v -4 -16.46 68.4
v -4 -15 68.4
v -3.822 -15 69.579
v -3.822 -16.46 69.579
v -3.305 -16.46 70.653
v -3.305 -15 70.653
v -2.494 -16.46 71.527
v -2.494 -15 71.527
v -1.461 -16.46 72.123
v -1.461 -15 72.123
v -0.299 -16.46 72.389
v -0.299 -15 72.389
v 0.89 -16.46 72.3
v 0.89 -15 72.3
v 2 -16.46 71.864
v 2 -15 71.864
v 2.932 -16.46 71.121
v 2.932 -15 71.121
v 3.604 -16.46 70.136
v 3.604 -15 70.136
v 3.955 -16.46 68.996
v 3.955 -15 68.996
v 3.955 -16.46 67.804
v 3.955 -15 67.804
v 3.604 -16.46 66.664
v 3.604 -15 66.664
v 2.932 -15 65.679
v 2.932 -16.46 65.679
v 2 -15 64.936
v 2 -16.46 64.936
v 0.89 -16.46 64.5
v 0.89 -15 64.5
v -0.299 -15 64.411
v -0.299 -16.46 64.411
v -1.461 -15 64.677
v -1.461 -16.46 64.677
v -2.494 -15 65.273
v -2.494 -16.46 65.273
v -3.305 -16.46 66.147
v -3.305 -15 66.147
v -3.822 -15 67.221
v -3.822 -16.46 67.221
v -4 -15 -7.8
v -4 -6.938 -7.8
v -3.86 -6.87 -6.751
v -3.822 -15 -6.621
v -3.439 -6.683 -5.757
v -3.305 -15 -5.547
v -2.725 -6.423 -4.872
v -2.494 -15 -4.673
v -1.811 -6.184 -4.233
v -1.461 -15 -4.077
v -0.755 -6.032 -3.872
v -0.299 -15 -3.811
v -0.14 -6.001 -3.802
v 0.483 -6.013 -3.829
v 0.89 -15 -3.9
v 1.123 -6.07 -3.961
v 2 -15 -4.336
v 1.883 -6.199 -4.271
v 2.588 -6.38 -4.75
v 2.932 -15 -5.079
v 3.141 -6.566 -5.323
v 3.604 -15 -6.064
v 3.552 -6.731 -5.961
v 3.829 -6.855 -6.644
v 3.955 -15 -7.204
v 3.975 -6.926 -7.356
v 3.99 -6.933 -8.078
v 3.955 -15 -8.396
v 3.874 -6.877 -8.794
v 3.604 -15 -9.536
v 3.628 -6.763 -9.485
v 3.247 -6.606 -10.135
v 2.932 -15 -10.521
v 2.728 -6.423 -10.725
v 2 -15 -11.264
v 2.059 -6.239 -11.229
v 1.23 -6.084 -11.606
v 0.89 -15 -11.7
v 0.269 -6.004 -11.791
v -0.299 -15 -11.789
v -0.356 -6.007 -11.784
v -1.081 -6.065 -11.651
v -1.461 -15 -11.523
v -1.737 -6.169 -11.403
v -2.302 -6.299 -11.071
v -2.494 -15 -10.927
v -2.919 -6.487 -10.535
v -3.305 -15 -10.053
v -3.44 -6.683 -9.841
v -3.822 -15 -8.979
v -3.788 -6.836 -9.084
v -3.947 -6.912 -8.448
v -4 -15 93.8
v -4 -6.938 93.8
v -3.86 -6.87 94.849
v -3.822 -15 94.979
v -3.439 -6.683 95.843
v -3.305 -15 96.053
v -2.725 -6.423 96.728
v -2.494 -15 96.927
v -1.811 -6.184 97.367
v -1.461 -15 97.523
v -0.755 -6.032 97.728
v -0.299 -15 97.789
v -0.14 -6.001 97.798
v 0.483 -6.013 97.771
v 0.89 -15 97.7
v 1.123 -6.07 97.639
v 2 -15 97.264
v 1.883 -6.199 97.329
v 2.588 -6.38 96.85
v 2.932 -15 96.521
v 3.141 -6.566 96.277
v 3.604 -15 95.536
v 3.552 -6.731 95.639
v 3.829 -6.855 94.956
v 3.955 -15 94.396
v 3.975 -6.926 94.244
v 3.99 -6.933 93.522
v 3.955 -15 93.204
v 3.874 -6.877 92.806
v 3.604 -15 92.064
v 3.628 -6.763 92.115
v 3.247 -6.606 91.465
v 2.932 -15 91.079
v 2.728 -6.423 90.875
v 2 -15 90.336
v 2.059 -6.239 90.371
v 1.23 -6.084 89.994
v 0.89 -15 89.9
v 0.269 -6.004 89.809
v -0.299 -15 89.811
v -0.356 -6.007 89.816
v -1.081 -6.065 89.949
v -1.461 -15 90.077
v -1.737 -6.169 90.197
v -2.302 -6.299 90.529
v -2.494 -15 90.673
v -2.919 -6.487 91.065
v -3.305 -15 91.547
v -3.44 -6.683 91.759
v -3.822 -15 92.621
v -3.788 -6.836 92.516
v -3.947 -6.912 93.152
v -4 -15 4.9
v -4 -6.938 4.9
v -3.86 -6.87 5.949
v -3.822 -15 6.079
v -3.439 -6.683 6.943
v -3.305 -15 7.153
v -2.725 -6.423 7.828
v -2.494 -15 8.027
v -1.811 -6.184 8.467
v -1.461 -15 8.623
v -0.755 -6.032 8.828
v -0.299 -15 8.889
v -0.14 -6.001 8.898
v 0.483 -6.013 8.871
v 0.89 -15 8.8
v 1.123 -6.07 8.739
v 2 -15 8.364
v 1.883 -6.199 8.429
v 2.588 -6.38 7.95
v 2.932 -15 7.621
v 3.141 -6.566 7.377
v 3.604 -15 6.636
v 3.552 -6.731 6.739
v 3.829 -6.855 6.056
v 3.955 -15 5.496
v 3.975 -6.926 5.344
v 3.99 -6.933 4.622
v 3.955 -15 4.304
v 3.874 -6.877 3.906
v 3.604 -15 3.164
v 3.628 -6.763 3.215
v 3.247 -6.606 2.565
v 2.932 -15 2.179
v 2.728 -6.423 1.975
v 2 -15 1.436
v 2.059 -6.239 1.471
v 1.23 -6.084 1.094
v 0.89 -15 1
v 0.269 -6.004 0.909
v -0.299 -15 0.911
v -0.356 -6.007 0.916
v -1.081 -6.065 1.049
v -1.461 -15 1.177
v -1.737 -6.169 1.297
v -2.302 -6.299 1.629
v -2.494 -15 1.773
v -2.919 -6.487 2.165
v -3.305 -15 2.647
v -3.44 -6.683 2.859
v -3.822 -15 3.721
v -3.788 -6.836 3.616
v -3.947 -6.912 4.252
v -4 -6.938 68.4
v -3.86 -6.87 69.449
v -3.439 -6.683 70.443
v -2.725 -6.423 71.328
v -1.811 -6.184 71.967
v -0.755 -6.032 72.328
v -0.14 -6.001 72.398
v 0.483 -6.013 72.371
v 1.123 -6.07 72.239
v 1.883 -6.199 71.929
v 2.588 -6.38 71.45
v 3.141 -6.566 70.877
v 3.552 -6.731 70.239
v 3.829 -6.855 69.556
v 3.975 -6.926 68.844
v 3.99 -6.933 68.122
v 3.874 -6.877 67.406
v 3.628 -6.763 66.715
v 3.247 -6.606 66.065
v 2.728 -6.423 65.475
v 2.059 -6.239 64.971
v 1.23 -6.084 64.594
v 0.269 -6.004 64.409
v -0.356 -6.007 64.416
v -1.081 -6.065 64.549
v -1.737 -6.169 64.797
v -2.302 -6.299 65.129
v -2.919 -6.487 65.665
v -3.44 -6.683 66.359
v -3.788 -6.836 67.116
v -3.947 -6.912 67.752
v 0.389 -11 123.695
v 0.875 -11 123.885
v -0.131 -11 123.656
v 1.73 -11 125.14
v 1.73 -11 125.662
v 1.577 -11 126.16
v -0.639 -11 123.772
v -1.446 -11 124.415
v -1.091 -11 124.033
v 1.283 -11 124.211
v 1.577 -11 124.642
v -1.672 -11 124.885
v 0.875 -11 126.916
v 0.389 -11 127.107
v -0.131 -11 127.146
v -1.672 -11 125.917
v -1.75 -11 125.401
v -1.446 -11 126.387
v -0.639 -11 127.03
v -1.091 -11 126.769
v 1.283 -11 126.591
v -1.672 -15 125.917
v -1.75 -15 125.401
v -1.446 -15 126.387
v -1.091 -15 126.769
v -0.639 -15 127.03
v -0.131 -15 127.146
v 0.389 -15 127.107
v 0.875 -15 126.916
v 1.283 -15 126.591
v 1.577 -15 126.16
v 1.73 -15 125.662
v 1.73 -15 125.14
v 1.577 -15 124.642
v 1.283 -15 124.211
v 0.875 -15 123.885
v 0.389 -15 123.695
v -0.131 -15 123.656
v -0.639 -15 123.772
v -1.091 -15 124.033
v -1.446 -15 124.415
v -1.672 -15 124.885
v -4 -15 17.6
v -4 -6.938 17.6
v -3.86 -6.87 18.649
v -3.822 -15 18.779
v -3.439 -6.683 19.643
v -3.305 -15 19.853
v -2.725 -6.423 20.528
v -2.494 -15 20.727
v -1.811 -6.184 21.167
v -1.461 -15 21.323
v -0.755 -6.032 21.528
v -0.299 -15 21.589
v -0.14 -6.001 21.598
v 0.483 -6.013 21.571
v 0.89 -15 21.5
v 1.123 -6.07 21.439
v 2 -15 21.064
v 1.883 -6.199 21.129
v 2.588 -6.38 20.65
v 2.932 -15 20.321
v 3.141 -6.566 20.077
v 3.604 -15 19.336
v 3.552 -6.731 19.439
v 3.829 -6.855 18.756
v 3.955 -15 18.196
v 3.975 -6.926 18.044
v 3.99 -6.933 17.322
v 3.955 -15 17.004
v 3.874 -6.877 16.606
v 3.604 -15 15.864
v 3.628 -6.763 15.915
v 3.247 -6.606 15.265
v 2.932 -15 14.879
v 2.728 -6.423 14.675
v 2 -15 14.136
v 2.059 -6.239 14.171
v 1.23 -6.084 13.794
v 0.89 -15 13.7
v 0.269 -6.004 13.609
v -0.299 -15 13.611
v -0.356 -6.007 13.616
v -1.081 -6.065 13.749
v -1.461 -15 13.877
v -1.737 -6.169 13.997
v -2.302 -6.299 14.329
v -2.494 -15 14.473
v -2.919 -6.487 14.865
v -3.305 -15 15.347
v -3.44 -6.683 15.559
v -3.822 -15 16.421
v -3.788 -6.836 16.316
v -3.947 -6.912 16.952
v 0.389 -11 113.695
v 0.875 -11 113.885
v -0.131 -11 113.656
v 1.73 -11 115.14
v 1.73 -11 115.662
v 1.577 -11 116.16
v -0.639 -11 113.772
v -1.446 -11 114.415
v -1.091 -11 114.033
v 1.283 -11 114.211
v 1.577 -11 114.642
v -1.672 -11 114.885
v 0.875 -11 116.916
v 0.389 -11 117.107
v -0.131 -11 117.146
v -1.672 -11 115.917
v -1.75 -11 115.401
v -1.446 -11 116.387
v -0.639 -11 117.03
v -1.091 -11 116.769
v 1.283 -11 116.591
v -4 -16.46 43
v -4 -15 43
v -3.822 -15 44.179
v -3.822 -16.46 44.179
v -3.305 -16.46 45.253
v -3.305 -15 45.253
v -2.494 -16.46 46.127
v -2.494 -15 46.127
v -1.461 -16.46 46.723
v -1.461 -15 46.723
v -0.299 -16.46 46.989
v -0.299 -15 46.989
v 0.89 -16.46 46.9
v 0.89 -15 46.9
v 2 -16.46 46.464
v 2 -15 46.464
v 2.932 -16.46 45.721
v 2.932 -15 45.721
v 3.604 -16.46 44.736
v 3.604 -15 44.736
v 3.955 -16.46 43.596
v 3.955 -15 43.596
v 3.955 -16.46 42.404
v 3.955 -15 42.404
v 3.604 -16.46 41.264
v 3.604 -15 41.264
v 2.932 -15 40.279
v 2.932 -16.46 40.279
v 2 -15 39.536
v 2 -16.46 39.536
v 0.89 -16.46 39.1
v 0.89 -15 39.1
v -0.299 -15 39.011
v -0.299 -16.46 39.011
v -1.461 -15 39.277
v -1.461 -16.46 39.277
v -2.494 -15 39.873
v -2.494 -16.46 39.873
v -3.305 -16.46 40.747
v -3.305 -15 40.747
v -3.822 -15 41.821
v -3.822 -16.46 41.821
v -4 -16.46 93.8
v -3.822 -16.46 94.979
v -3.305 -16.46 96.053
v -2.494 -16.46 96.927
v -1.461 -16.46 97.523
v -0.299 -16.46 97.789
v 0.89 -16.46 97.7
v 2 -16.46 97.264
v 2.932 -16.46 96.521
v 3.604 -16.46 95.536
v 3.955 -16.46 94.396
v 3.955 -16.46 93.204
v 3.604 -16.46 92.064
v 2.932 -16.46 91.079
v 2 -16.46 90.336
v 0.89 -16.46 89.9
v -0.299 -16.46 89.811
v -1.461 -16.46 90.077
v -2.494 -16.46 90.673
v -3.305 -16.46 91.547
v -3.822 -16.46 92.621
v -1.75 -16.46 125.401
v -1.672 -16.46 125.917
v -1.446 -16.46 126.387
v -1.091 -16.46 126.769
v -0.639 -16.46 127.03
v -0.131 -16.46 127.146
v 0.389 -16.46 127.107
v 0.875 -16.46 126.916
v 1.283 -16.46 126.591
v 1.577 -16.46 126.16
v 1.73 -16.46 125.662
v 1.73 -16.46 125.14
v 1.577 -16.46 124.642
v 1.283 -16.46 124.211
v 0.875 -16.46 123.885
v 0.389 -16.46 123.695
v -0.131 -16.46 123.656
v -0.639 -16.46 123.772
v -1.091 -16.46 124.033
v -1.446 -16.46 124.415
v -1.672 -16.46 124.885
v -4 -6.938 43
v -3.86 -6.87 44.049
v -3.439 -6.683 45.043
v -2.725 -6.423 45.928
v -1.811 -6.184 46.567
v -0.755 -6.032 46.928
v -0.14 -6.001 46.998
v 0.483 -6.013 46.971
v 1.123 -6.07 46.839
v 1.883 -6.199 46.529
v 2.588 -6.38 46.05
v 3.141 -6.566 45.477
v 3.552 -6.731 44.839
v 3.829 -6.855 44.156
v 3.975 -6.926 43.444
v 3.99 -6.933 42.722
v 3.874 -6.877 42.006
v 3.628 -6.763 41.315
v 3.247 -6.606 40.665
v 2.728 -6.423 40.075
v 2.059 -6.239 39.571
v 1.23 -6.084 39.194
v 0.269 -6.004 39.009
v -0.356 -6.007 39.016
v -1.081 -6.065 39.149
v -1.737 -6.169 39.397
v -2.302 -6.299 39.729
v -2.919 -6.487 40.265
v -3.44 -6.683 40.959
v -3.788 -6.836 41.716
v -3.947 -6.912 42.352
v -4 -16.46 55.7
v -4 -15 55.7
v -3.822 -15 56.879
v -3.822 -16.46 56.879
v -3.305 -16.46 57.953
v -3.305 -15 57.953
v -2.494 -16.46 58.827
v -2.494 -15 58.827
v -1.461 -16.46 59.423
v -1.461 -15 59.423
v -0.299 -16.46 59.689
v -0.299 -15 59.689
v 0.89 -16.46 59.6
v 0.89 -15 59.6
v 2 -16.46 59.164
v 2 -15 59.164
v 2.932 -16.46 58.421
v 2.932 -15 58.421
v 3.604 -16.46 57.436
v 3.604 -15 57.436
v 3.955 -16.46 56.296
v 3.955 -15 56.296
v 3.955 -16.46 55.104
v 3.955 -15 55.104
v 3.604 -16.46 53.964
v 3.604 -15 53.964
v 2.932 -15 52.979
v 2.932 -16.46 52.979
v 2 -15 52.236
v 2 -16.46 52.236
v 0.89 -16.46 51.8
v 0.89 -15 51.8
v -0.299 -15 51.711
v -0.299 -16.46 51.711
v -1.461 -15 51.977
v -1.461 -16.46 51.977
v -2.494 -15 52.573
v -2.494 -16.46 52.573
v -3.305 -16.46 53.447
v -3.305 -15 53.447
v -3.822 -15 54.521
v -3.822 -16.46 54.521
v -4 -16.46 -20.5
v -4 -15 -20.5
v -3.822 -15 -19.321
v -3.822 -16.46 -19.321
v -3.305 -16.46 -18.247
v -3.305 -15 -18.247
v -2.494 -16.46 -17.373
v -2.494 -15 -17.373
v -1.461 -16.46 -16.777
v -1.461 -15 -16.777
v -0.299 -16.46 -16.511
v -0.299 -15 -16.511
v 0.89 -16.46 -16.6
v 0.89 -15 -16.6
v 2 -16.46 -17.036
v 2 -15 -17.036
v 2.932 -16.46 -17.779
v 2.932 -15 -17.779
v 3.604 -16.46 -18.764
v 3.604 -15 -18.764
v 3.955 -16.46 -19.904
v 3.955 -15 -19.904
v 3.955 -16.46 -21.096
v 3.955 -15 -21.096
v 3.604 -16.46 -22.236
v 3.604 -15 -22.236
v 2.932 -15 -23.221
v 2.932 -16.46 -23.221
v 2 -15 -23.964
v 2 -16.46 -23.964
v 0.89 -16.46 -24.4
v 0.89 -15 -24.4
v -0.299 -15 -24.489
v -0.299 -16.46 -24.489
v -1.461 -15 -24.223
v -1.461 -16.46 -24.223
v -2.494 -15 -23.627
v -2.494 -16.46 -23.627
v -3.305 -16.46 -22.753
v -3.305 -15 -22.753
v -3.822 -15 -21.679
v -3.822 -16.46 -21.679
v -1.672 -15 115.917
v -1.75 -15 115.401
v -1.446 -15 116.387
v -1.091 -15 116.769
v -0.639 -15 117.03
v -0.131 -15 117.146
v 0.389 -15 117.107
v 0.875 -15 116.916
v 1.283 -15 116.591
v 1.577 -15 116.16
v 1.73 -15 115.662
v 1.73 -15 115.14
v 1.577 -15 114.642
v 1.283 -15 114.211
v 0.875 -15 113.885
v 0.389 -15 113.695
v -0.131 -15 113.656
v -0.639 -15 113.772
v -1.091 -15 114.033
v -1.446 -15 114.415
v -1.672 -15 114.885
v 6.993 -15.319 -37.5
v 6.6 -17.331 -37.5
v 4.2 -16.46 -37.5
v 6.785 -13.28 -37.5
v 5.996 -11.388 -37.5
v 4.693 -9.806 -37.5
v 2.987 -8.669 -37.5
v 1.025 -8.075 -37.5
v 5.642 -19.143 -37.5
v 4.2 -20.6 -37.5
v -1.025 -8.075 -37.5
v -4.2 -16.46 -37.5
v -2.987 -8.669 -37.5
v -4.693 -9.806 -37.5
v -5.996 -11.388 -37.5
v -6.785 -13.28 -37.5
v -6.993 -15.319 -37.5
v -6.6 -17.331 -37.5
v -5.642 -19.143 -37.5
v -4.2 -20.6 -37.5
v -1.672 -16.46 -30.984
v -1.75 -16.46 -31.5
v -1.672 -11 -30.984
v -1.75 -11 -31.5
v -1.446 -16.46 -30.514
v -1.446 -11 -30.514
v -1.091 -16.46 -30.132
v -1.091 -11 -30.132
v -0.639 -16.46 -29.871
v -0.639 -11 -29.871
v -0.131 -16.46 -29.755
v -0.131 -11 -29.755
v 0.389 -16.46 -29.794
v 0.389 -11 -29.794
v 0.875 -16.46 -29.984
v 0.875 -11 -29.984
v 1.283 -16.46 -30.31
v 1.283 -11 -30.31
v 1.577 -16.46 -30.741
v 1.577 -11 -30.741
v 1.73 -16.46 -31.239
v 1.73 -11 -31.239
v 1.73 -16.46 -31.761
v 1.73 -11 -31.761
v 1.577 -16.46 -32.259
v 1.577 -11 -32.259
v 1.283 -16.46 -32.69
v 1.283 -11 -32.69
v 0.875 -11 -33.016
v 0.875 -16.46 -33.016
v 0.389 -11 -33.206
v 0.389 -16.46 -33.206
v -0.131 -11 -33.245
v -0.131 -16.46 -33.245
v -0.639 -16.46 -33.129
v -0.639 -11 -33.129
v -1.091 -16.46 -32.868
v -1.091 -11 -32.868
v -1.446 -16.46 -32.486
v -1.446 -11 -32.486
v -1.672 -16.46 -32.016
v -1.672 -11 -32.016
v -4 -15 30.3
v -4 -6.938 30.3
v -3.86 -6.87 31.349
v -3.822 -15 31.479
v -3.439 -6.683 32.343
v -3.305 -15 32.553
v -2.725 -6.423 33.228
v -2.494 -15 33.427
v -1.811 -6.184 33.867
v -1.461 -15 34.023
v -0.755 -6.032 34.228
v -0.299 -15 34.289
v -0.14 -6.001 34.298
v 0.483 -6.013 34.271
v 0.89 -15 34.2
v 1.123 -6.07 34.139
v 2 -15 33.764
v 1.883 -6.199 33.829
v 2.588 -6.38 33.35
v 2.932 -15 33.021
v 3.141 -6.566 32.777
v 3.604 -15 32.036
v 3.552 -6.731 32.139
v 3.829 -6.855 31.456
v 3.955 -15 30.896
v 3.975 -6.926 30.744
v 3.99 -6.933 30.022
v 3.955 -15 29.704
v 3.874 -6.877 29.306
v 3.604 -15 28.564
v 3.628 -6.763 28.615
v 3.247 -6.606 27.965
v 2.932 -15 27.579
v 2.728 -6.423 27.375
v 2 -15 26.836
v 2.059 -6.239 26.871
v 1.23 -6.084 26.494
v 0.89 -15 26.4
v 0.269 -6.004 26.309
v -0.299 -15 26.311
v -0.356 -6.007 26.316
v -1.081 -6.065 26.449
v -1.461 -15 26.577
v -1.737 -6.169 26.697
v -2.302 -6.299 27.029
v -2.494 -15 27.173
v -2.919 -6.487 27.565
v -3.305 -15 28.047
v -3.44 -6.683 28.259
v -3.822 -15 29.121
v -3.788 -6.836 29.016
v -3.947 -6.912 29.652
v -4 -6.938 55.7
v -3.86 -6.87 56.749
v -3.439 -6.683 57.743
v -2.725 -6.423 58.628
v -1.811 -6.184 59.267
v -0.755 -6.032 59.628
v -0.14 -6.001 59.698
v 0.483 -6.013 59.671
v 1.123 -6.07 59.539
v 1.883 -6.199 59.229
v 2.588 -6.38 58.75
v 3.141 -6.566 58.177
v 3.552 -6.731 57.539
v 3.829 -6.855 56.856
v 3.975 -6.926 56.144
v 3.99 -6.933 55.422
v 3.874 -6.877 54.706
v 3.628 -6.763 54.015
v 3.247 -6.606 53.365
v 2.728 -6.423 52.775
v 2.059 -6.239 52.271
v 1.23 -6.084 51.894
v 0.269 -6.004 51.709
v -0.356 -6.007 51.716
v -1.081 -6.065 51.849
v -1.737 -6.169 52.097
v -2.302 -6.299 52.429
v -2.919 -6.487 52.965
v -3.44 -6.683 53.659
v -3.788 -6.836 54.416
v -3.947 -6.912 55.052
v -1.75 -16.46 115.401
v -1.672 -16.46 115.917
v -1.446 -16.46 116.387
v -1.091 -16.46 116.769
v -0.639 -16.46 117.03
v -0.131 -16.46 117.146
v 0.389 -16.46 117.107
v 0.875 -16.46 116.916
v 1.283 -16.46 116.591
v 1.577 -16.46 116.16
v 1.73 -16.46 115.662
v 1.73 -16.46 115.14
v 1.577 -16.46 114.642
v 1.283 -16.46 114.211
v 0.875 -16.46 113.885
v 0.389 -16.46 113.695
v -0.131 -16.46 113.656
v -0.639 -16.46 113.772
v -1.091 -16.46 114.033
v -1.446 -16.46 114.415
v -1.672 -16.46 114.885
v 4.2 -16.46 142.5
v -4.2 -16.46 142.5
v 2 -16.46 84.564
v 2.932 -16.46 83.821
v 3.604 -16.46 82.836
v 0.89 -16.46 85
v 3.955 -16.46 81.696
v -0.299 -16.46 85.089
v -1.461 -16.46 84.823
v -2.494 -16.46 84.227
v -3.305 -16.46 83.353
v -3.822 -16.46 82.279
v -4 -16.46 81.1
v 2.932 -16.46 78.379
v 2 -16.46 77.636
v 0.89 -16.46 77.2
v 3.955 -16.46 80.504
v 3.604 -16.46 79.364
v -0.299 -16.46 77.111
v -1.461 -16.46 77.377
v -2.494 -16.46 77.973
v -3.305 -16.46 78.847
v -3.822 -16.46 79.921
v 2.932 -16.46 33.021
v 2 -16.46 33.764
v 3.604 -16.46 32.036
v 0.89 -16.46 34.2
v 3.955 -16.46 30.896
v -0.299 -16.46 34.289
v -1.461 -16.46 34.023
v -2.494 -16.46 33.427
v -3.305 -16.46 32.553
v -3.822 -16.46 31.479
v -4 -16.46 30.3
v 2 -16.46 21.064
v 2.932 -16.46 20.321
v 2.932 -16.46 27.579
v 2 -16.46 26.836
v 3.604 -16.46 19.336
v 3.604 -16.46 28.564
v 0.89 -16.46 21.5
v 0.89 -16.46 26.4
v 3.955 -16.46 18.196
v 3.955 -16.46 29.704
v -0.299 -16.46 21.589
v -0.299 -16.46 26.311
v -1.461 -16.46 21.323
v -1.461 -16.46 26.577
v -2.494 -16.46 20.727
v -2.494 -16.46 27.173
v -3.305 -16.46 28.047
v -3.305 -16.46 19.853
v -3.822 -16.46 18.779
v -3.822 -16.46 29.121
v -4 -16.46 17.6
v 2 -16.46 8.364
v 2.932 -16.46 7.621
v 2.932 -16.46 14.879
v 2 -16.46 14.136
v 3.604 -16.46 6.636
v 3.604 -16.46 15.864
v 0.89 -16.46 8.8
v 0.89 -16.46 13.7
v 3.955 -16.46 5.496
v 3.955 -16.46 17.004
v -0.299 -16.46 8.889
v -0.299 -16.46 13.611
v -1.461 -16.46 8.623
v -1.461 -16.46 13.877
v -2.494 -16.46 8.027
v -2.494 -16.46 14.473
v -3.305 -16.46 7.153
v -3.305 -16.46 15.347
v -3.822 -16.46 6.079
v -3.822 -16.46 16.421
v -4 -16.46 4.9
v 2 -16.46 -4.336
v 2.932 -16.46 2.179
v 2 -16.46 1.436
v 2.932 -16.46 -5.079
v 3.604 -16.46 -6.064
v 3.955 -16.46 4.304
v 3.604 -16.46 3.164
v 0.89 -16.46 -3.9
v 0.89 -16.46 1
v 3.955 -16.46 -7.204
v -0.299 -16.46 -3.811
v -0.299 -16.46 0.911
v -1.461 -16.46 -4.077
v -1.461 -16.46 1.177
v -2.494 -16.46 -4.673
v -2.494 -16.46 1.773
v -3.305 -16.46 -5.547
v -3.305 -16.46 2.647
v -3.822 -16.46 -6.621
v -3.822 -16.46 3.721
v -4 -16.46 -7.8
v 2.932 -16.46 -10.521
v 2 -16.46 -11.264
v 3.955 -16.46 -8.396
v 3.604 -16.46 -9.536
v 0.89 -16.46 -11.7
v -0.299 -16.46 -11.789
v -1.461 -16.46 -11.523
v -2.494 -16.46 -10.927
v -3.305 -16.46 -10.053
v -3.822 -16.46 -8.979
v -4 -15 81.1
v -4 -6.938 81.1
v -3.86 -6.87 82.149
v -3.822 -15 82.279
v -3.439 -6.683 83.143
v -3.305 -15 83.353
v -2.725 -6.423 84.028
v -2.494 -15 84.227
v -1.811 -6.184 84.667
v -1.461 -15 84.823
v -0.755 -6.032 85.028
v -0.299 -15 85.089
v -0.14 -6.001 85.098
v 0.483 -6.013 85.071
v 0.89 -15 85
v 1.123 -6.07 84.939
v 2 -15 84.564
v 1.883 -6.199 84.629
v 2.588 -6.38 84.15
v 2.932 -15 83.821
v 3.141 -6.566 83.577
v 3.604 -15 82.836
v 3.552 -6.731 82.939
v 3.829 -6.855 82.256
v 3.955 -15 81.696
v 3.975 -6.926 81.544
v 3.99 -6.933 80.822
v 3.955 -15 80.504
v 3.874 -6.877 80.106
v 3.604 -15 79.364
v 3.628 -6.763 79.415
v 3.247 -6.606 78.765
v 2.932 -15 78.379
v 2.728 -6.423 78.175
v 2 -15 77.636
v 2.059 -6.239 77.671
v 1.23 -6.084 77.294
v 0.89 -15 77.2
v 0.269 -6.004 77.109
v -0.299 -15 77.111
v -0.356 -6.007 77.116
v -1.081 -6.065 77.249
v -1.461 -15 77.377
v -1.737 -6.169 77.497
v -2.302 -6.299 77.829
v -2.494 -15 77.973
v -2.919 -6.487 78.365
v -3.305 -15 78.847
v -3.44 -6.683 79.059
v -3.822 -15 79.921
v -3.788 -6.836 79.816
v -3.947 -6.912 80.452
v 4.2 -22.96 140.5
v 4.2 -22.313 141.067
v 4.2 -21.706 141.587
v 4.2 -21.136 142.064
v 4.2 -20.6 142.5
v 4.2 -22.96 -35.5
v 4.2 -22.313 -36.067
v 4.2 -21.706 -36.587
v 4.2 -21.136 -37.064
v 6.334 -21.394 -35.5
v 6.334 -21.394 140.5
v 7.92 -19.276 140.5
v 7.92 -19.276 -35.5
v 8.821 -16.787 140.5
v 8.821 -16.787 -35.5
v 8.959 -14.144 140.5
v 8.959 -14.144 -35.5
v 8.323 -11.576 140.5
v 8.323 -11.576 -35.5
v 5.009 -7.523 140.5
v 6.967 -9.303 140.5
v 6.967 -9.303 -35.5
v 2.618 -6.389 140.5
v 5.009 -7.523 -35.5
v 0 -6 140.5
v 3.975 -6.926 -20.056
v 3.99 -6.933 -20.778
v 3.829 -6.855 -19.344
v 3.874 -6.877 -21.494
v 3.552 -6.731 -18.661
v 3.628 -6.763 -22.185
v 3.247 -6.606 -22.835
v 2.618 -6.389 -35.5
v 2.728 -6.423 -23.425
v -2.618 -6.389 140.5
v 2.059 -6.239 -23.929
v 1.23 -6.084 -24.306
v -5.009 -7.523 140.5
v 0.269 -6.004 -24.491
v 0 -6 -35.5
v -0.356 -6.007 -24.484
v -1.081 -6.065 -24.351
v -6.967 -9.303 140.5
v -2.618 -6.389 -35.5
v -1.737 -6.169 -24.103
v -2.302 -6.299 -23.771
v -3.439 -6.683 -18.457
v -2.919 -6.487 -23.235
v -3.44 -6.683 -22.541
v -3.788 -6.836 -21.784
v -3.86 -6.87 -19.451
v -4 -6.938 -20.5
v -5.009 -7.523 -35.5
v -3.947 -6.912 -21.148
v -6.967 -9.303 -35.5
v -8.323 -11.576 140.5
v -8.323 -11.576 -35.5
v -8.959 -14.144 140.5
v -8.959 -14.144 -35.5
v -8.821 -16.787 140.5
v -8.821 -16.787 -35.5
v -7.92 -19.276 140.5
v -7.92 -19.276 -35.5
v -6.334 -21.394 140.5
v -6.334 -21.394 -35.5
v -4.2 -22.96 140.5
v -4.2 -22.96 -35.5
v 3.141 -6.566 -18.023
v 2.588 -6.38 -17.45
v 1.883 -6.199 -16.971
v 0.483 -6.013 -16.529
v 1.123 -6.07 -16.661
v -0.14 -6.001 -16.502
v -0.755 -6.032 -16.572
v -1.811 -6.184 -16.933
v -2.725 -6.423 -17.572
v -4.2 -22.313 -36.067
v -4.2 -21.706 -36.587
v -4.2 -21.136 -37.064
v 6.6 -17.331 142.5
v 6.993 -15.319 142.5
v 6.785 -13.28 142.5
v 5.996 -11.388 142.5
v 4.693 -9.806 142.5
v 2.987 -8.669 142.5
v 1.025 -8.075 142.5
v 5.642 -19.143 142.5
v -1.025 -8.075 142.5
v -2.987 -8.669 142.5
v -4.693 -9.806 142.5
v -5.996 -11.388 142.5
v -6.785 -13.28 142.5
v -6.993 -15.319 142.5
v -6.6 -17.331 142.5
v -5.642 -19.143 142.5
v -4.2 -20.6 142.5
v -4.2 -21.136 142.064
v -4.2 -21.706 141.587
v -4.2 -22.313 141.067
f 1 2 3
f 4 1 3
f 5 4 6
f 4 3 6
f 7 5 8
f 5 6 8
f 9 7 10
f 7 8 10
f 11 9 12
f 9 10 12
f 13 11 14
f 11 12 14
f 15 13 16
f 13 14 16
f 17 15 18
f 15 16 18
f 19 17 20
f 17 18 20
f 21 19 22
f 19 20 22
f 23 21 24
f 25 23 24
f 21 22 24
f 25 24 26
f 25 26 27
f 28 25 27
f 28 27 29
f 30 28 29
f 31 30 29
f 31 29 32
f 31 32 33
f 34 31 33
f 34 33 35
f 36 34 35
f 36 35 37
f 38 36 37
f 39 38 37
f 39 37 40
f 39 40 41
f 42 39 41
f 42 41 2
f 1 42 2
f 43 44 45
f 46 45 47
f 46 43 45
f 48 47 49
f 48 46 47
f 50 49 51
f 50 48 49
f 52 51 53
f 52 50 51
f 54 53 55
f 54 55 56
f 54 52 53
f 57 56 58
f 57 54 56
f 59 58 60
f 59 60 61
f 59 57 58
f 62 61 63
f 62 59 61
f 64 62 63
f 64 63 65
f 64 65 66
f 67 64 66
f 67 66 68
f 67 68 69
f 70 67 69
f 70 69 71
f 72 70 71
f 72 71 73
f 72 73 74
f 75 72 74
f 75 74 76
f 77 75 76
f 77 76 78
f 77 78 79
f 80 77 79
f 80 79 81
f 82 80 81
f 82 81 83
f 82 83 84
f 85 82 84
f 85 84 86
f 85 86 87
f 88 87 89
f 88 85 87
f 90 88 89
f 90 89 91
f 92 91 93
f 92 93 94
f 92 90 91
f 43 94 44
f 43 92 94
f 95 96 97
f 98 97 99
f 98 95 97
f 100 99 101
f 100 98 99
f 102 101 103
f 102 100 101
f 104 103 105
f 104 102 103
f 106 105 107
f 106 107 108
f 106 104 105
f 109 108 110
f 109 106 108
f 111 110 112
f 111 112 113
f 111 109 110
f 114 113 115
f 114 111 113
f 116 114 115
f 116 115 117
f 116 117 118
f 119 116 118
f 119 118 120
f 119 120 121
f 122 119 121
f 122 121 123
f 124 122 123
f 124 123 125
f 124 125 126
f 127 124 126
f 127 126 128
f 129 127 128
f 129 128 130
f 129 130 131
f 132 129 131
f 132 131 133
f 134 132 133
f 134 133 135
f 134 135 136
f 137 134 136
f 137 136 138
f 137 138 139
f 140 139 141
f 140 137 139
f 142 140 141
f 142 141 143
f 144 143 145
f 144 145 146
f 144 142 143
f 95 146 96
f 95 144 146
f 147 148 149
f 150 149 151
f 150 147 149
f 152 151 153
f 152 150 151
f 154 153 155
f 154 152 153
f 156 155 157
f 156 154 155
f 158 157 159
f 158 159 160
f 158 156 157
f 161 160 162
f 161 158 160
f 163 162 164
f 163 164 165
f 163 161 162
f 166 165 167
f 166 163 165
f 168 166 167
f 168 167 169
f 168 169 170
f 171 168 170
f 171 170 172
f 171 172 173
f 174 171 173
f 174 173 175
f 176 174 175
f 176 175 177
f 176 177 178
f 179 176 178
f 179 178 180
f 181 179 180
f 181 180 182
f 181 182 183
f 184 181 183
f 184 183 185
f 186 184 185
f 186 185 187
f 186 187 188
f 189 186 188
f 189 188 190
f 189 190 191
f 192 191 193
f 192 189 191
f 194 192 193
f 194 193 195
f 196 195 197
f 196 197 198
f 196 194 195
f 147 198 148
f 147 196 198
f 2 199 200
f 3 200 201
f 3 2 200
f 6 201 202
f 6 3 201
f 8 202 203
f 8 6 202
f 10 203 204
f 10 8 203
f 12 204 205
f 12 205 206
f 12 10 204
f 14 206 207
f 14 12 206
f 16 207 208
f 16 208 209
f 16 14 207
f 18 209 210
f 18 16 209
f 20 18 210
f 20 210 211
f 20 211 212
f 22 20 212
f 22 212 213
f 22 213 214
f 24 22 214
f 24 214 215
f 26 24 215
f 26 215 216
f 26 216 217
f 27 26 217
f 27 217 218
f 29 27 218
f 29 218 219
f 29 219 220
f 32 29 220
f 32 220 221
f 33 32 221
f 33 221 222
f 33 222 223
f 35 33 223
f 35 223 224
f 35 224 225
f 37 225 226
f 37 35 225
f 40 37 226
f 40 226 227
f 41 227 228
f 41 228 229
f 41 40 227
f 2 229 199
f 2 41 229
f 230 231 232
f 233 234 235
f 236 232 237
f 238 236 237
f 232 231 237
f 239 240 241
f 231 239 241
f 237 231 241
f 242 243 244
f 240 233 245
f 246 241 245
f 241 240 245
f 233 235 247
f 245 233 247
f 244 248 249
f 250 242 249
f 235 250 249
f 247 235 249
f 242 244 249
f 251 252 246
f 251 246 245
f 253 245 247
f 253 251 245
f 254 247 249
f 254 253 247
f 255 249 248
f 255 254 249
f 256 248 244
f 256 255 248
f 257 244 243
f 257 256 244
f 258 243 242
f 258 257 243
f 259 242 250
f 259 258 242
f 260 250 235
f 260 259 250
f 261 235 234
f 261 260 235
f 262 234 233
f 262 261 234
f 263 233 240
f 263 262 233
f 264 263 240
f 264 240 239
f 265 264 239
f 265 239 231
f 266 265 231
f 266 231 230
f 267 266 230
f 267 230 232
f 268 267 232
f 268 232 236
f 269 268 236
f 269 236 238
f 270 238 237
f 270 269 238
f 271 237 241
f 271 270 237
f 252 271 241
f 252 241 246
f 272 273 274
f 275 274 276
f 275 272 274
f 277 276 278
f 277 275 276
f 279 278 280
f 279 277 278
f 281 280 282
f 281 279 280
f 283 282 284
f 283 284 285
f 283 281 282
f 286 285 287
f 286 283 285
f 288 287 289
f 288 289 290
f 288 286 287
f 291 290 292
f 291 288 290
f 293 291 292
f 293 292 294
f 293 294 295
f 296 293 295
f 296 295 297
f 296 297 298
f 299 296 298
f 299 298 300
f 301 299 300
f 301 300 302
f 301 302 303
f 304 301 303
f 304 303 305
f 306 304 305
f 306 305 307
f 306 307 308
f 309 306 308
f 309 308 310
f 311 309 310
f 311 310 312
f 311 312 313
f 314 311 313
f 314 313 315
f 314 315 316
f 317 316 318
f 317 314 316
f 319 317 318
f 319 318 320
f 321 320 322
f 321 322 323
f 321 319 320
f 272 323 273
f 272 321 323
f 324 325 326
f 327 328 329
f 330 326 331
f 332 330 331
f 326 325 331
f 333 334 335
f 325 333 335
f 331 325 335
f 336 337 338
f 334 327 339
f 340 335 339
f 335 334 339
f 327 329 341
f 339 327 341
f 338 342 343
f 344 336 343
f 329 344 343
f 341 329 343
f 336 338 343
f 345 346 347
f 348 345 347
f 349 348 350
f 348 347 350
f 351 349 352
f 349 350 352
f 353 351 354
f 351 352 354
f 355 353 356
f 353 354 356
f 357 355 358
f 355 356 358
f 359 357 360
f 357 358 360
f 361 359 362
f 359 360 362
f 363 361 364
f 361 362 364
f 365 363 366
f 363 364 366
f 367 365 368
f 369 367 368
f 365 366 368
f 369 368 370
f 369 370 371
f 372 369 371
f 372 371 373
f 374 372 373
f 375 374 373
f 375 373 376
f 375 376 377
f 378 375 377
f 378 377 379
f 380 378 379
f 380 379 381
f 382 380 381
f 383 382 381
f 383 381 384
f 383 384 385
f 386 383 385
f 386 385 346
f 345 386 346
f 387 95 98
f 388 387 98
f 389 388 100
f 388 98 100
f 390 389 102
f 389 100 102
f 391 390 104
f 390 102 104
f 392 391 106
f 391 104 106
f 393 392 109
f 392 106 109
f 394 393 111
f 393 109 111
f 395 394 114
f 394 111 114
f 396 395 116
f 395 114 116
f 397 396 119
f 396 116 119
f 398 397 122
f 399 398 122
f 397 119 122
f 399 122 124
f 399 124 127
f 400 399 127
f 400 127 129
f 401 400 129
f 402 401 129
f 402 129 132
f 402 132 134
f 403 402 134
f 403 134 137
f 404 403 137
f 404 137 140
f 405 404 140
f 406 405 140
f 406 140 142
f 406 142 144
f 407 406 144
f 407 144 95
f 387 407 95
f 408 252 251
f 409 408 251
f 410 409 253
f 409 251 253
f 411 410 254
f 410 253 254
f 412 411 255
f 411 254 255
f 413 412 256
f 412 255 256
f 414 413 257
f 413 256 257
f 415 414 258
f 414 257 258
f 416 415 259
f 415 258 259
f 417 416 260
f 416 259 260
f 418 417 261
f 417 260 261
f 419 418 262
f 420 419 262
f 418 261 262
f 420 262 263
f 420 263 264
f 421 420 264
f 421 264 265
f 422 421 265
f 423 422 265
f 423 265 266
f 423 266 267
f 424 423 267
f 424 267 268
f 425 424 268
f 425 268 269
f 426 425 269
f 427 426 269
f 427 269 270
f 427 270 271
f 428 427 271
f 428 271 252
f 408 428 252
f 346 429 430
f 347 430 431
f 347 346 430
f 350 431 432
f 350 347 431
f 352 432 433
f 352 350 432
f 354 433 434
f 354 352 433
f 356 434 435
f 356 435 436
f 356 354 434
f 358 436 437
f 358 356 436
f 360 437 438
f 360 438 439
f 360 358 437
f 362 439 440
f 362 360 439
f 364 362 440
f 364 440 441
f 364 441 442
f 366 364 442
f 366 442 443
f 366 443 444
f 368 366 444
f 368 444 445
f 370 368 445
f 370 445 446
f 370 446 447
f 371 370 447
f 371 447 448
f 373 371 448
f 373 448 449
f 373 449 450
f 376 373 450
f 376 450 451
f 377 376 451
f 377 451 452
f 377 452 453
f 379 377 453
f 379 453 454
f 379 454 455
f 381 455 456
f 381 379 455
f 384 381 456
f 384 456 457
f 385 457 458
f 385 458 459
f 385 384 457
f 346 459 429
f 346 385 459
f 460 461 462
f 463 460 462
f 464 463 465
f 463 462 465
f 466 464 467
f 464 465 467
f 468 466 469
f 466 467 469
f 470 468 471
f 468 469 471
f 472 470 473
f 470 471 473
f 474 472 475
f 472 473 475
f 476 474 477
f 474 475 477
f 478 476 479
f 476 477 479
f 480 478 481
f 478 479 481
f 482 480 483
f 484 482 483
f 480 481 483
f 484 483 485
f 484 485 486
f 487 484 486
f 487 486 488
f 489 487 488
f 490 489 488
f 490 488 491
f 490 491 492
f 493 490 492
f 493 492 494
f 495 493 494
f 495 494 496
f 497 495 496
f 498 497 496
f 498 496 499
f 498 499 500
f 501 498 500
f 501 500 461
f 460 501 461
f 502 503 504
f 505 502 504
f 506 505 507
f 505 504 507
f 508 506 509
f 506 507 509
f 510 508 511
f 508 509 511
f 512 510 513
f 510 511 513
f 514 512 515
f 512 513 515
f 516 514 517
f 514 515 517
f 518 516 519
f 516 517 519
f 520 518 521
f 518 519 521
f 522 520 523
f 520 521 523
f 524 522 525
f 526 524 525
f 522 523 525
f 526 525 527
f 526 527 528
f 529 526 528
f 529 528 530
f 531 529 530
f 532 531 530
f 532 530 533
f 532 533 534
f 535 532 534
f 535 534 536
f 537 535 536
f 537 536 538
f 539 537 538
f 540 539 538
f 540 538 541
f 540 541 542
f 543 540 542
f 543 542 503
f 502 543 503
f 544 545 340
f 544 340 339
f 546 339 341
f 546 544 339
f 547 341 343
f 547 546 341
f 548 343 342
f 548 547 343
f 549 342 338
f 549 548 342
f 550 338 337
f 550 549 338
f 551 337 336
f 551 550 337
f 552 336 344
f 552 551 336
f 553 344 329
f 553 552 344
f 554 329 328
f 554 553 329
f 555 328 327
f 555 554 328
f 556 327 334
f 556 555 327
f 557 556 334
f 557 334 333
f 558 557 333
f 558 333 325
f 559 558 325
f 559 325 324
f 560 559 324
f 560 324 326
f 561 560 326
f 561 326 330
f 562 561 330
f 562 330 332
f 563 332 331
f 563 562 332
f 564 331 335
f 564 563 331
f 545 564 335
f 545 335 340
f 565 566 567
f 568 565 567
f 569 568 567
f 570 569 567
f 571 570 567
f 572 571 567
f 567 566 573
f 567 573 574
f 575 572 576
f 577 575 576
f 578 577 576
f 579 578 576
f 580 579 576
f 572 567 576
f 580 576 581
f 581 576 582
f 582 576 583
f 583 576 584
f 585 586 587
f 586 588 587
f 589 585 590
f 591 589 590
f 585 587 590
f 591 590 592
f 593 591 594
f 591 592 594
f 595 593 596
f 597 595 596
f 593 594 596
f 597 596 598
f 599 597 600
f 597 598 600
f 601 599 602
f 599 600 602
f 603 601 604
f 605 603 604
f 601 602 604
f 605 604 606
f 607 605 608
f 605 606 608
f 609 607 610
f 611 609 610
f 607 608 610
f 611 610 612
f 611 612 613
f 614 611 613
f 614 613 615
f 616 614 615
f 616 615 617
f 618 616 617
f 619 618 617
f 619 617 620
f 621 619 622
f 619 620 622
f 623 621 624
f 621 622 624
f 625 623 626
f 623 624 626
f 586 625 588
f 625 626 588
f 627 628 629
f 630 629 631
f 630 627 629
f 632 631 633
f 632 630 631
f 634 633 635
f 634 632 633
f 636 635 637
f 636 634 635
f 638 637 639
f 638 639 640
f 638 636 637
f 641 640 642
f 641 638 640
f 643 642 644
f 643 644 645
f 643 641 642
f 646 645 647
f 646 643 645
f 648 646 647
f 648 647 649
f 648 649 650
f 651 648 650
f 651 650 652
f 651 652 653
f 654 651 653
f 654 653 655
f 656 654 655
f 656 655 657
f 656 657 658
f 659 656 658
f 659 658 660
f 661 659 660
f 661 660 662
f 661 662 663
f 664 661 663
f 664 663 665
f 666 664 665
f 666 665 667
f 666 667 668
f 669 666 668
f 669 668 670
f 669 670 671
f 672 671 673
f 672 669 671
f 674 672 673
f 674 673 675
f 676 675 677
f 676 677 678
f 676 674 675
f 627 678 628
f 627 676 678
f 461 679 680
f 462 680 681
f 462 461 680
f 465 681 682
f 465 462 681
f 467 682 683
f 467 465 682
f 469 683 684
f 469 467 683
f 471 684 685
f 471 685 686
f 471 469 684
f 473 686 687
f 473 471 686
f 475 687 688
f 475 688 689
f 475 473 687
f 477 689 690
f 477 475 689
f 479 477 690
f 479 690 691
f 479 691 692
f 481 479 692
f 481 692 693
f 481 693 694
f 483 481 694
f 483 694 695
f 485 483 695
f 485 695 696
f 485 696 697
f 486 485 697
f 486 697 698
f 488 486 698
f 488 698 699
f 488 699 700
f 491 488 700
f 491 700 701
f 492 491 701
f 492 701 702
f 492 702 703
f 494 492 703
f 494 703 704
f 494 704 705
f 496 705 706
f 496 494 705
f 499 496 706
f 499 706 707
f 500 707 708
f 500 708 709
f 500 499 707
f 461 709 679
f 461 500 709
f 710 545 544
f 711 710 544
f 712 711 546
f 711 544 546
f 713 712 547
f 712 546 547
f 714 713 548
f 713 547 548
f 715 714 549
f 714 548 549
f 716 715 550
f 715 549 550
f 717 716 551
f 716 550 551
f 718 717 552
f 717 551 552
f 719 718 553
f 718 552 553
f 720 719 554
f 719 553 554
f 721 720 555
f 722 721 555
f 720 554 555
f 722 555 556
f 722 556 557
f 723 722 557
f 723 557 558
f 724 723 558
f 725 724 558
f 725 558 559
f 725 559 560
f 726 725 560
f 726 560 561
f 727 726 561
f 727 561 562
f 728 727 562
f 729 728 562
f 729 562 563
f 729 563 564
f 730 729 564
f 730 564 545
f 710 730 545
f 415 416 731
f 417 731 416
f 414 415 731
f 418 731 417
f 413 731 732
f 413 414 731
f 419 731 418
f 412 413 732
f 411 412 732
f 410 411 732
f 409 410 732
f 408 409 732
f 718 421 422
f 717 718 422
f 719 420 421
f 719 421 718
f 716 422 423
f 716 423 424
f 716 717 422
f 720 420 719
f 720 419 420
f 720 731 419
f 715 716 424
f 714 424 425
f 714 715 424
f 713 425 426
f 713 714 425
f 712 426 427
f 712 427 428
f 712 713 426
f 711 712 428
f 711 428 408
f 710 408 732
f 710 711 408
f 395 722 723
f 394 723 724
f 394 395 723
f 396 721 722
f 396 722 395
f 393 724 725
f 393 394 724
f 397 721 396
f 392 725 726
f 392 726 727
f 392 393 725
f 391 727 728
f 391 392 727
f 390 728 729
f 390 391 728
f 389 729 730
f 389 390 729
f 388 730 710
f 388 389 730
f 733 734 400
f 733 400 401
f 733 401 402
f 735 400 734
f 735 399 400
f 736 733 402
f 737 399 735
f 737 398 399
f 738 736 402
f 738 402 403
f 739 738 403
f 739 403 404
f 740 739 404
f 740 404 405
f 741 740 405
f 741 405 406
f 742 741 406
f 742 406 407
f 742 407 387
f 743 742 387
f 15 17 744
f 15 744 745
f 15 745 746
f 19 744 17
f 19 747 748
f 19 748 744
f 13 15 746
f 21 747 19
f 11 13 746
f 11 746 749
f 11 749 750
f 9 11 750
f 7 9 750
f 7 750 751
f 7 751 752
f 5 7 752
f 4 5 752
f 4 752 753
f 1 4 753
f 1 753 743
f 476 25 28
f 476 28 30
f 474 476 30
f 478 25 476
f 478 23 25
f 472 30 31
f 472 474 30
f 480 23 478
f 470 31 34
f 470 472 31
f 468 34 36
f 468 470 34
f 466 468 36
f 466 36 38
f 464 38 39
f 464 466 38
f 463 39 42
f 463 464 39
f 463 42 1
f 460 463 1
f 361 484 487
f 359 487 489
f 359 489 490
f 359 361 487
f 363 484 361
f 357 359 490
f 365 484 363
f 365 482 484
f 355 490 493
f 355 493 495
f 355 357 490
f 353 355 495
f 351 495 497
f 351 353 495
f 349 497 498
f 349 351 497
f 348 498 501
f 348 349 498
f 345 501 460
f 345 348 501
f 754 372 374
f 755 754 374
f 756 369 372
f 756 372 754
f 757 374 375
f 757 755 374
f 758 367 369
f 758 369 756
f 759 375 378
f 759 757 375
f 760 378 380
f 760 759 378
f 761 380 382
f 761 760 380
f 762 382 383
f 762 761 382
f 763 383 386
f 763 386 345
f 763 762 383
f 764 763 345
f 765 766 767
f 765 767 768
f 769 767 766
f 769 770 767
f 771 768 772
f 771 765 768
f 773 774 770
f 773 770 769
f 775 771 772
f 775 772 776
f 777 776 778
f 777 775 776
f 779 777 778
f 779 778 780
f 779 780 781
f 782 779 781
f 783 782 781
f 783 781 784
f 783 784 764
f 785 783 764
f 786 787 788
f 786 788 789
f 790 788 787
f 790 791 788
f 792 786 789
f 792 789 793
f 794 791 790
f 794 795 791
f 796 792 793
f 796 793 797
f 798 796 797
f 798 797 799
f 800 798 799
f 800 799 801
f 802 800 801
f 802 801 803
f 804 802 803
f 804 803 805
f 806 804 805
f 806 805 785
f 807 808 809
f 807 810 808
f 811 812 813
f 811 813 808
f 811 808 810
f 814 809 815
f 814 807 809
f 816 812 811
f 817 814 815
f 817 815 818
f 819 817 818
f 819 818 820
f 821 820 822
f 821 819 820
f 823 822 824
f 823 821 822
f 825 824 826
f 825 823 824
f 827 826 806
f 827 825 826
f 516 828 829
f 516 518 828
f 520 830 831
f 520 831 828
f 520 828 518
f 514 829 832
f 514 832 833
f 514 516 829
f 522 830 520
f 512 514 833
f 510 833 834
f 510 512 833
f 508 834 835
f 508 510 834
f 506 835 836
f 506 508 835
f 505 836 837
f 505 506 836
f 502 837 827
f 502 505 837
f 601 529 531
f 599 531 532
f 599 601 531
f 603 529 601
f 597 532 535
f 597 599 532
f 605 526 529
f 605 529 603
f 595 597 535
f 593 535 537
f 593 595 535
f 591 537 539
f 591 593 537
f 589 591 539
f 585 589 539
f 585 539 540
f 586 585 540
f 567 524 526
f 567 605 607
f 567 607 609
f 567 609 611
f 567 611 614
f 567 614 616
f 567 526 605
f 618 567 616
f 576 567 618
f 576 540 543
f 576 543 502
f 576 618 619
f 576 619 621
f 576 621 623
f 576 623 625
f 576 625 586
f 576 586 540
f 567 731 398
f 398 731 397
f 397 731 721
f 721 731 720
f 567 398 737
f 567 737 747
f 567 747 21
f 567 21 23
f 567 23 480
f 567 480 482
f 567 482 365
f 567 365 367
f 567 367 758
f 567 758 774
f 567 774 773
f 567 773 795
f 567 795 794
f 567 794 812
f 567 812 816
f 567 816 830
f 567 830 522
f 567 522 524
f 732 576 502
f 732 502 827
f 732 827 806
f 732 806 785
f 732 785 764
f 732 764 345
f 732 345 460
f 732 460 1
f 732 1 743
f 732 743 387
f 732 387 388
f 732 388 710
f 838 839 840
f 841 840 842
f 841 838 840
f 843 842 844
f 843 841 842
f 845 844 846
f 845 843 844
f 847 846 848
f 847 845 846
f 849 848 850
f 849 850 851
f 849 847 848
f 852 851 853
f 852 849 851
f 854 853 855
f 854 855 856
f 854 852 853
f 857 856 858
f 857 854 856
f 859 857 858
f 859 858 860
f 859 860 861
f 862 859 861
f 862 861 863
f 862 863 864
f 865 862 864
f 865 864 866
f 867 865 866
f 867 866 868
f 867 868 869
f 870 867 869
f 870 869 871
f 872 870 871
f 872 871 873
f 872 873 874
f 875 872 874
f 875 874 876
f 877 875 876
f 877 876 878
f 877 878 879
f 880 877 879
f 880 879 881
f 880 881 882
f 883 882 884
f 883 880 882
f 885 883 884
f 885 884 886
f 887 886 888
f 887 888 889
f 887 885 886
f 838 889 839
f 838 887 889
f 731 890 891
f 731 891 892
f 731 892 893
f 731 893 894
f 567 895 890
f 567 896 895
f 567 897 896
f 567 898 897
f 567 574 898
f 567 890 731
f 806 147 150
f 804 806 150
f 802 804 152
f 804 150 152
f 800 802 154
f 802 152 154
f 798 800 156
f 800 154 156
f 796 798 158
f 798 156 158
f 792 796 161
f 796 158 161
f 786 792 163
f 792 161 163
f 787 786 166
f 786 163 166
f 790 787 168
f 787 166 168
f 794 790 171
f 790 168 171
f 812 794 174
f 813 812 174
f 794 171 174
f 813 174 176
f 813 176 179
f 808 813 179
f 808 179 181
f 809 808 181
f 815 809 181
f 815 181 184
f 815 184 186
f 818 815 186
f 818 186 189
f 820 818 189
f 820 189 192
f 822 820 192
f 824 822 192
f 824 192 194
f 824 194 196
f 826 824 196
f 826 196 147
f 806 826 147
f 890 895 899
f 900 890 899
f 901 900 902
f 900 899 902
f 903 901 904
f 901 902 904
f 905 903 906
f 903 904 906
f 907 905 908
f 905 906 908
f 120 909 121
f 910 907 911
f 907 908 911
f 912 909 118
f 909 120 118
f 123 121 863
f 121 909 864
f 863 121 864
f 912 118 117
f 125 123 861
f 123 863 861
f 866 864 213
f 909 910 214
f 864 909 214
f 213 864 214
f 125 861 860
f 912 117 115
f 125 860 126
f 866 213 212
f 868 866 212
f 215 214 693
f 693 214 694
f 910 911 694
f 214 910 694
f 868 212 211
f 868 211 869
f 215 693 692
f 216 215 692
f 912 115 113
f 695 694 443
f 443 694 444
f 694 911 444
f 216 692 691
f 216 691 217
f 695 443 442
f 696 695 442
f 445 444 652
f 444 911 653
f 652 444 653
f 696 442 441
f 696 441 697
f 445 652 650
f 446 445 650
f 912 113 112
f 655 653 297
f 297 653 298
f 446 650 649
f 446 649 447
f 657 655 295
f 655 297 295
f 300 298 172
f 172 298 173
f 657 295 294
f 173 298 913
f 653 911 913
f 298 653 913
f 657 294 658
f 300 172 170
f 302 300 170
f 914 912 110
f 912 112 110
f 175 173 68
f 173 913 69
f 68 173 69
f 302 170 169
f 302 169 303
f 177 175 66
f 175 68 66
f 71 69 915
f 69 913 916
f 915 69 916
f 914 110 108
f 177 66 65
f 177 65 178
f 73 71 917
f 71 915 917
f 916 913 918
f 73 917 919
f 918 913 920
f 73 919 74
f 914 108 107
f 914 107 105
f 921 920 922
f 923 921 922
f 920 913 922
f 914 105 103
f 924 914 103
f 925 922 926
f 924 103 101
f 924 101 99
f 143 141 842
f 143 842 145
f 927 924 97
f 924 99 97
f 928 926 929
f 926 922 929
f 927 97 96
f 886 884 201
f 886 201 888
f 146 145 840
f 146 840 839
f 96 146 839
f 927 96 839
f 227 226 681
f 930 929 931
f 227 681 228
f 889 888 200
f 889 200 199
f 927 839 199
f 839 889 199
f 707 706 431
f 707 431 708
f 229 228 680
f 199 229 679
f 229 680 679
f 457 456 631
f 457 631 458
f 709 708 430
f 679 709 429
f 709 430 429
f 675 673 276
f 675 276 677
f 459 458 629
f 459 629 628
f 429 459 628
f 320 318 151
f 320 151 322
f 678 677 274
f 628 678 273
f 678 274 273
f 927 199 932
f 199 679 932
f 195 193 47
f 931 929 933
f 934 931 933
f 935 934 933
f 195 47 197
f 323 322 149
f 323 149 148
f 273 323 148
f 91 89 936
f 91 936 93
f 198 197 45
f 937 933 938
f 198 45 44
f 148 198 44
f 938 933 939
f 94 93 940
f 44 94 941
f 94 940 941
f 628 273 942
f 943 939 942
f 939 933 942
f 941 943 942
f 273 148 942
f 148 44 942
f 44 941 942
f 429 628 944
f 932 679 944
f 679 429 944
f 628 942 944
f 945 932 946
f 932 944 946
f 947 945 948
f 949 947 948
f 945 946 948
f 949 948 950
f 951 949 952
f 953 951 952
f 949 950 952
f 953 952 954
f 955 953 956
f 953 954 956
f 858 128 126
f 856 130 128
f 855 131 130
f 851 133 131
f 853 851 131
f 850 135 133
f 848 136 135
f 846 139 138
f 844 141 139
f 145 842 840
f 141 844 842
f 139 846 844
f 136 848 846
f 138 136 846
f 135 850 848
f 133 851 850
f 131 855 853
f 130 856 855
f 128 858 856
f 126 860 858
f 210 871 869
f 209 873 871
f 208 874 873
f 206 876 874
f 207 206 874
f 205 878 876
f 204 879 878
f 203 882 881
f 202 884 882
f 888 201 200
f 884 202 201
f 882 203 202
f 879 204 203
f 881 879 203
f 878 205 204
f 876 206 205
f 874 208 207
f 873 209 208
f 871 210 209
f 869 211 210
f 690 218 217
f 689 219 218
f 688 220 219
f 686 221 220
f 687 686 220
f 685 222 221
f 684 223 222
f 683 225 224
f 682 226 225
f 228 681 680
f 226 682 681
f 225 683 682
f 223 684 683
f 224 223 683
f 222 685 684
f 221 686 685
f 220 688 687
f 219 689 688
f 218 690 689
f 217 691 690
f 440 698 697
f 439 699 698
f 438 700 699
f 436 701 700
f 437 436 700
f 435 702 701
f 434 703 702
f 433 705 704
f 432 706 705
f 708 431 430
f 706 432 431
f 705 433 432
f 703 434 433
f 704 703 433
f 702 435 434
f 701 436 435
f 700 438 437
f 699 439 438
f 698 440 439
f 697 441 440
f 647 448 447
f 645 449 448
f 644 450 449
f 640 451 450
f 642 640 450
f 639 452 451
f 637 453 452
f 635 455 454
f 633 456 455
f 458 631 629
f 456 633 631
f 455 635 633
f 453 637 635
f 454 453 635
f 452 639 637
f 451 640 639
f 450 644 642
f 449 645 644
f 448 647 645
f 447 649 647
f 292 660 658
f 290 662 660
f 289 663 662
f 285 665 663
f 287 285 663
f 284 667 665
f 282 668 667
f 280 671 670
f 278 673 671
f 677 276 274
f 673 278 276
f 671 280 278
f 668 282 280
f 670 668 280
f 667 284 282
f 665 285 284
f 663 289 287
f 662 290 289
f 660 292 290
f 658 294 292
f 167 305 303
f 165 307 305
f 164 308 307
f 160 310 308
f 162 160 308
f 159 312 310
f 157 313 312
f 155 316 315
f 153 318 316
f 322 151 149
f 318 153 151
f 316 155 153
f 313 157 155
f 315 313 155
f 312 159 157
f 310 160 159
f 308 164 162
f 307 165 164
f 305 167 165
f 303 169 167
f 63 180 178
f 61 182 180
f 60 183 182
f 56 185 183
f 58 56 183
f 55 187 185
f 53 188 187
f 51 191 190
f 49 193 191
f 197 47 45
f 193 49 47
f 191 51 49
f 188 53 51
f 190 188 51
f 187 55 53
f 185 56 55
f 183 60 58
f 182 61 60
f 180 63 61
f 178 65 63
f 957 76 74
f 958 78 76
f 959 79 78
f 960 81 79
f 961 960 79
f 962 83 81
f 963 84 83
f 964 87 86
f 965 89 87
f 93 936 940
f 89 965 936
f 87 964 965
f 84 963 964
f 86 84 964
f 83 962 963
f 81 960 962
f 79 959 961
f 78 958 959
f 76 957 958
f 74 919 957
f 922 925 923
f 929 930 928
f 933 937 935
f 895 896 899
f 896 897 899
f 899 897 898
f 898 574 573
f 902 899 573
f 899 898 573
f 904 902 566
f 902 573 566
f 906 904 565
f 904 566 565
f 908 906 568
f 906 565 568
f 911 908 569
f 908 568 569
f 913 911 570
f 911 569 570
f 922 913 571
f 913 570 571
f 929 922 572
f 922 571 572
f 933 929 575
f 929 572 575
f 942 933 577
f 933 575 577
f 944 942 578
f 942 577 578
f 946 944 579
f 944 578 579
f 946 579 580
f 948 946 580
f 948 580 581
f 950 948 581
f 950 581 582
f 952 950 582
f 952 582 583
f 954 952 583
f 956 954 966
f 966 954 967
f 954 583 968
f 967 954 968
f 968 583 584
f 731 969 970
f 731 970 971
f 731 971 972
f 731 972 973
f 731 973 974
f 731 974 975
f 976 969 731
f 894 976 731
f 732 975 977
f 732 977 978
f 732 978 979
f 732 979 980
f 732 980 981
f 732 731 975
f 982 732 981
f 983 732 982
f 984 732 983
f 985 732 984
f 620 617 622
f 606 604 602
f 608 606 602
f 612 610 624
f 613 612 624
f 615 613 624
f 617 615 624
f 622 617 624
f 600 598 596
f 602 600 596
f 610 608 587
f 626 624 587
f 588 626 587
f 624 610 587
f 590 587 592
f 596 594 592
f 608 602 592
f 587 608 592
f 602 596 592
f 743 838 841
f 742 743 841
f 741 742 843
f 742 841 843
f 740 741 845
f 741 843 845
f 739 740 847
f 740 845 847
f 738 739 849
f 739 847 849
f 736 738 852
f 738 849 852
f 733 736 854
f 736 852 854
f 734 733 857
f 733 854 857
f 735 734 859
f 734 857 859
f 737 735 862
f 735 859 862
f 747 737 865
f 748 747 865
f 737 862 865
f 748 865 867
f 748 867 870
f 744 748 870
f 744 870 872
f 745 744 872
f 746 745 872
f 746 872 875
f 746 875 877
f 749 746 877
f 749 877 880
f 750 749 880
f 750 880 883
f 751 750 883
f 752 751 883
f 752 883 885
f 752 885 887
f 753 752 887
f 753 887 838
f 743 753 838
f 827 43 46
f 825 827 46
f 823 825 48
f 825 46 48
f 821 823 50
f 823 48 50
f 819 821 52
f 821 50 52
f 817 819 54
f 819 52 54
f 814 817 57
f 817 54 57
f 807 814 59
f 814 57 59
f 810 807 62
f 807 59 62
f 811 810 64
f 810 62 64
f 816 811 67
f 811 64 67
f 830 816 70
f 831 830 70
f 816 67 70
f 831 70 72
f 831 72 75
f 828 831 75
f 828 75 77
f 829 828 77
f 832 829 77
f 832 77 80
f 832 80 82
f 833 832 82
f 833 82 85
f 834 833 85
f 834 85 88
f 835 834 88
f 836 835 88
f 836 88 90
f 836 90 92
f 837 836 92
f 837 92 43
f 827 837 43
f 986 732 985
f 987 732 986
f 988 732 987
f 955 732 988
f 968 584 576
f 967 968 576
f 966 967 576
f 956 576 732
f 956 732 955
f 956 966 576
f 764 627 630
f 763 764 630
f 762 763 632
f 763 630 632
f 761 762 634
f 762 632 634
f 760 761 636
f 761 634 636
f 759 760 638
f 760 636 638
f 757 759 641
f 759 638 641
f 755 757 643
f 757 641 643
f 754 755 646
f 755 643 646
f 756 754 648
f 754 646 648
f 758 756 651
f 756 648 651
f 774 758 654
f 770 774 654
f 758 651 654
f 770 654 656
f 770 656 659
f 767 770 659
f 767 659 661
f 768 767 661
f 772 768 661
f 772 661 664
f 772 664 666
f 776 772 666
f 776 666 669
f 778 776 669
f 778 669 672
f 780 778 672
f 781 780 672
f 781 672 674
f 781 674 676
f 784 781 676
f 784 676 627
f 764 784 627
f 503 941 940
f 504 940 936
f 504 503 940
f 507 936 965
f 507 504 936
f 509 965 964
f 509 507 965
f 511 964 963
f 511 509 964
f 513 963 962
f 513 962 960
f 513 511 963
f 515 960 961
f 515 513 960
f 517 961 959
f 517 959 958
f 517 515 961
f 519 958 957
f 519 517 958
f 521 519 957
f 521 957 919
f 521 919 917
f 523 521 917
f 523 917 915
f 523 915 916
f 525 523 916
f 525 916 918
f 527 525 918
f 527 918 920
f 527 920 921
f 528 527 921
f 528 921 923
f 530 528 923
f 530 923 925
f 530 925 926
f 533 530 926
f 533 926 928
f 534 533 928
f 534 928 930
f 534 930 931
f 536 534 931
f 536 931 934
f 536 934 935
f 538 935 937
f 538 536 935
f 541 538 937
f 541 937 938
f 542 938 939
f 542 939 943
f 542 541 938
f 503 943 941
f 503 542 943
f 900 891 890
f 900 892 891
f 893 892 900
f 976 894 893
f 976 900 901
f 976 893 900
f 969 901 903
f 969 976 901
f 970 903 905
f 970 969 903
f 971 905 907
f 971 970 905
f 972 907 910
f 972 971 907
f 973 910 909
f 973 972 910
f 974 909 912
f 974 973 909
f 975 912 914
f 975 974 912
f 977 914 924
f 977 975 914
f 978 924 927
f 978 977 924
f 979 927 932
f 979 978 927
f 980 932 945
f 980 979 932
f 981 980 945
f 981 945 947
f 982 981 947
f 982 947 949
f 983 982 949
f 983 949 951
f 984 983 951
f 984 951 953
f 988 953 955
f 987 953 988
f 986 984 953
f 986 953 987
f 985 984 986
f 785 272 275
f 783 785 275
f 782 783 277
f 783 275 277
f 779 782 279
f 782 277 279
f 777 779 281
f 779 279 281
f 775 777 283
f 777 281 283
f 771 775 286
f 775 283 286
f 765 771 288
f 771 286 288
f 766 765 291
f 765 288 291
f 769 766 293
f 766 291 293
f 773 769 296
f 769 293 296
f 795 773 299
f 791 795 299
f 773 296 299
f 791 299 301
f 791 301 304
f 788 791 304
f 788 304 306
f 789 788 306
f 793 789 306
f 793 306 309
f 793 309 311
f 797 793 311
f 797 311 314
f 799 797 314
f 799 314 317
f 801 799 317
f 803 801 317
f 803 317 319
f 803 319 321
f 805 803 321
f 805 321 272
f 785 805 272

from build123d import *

# Parameters (mm, degrees)
PAD_DEPTH            = 180
CHAMFER_SIZE         = 2
SKETCH001_R          = 4
POCKET_DEPTH         = 7.960899
POCKET_DEPTH_BACK    = 9.001
SKETCH016_R          = 1.75
POCKET008_DEPTH      = 4
BODY_PLACEMENT_ANGLE = 180


with BuildPart() as part:
    # Sketch → Pad (new body)
    with BuildSketch(Plane.XY):
        with BuildLine():
            ThreePointArc((-4.2, 7.959899), (0, -9), (4.2, 7.959899))
            Line((4.2, 1.459899), (4.2, 7.959899))
            Line((-4.2, 1.459899), (4.2, 1.459899))
            Line((-4.2, 7.959899), (-4.2, 1.459899))
        make_face()
    extrude(amount=PAD_DEPTH)

    # Chamfer
    chamfer_edges = [part.edges().sort_by_distance(p)[0] for p in [
        (0, -9, 180),
        (0, -9, 0),
    ]]
    chamfer(chamfer_edges, length=CHAMFER_SIZE)

    # Sketch001 → Pocket (cut, two sides)
    with BuildSketch(Plane.XZ) as pocket_sk:
        with Locations((0, 17)):
            Circle(SKETCH001_R)
        with Locations((0, 29.7)):
            Circle(SKETCH001_R)
        with Locations((0, 42.4)):
            Circle(SKETCH001_R)
        with Locations((0, 55.1)):
            Circle(SKETCH001_R)
        with Locations((0, 67.8)):
            Circle(SKETCH001_R)
        with Locations((0, 80.5)):
            Circle(SKETCH001_R)
        with Locations((0, 93.2)):
            Circle(SKETCH001_R)
        with Locations((0, 105.9)):
            Circle(SKETCH001_R)
        with Locations((0, 118.6)):
            Circle(SKETCH001_R)
        with Locations((0, 131.3)):
            Circle(SKETCH001_R)
    extrude(amount=-POCKET_DEPTH, mode=Mode.SUBTRACT)
    extrude(pocket_sk.sketch, amount=POCKET_DEPTH_BACK, mode=Mode.SUBTRACT)

    # Sketch016 → Pocket008 (cut, symmetric)
    with BuildSketch(Plane.XZ):
        with Locations((0, 162.900868)):
            Circle(SKETCH016_R)
        with Locations((0, 152.900868)):
            Circle(SKETCH016_R)
        with Locations((0, 6)):
            Circle(SKETCH016_R)
    extrude(amount=POCKET008_DEPTH, both=True, mode=Mode.SUBTRACT)


with BuildPart() as part_1:
    # Body placement: moved
    add(part.part.moved(Location((0, -15, -37.5))).rotate(Axis((0, -15, -37.5), (0, 0, 1)), BODY_PLACEMENT_ANGLE))


solid = part_1.part
